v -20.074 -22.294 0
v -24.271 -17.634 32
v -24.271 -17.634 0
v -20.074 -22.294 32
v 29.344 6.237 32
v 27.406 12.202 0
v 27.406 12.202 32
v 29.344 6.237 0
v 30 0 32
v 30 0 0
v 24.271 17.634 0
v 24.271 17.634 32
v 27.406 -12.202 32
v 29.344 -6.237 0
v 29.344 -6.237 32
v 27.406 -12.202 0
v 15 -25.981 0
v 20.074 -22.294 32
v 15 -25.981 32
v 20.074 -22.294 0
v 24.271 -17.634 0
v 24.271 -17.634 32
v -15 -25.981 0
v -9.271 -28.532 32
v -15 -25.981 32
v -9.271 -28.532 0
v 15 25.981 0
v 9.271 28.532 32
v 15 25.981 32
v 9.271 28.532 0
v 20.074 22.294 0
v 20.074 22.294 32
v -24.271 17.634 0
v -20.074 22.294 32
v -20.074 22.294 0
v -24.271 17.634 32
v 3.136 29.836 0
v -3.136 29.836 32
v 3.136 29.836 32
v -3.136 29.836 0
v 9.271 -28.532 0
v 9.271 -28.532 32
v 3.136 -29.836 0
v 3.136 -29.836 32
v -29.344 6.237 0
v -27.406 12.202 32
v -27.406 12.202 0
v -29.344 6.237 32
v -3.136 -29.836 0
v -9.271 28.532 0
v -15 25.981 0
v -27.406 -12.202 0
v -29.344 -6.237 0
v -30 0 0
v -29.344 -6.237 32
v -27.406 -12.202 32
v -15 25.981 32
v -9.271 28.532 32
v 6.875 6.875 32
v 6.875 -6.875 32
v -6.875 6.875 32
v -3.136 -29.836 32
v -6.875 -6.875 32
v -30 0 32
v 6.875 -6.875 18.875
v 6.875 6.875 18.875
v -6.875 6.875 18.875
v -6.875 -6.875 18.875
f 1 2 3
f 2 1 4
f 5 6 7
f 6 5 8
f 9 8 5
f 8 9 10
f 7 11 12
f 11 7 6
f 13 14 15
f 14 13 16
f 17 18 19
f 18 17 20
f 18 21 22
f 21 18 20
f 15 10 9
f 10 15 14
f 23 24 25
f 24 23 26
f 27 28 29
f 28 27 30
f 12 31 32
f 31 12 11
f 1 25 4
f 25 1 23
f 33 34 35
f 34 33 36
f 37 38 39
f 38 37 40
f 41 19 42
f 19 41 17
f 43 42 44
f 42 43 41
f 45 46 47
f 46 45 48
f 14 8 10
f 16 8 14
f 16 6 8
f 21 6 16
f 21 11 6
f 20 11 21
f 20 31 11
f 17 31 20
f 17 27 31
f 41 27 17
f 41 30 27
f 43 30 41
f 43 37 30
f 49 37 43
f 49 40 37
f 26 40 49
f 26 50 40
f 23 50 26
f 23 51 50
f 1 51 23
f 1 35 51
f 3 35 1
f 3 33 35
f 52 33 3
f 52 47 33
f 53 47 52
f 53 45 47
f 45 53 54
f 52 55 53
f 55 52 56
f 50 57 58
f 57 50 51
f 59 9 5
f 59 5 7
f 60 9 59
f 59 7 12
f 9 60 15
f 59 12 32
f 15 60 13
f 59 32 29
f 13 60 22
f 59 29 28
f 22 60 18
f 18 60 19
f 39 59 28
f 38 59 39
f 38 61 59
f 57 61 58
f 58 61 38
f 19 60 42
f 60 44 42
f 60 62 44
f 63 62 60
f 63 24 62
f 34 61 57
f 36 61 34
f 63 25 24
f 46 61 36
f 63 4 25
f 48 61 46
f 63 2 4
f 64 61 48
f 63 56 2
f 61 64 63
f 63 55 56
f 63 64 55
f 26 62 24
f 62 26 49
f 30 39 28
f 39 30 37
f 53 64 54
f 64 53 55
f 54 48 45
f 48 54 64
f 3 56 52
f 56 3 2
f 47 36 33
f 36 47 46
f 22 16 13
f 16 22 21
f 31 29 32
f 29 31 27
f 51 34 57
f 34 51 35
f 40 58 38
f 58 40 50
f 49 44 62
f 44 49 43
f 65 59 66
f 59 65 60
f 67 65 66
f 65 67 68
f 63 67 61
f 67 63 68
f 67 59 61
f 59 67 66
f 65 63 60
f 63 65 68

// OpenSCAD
delta = 5;


cylinder_top = 37 - delta;
translate([0, 0, -delta]) {
    #difference() {
        translate([0, 0, delta]) cylinder(cylinder_top, 30, 30);

//module polar_cube() {
//    for 
//}


//# 144 * 2 = 12^2 + 12^2 = x^2
//# x^2 + x^2 = y^2
//# 144 * 4 = y^2

cube_size = 12.5;
    sy = sqrt(cube_size * cube_size) * 2;

hcs = cube_size * 0.5;

ry = atan(1 / sqrt(2));
//echo(ry);
//ry = 35.26;
        #translate([0, 0, delta + cylinder_top - hcs]) scale(1.1) translate([-hcs, -hcs, -hcs]) cube(cube_size);
//translate([0, 0, 1.5 * sy]) rotate([0, 0, 0]) rotate([0, ry, 0]) rotate([45, 0, 0]) scale(1.1)  translate([-7, -7, -7]) cube(14);
    }
}


//translate([0, 0, -delta]) #translate([0, 0, 30]) scale(1.1) translate([-7, -7, -7]) cube(14);
